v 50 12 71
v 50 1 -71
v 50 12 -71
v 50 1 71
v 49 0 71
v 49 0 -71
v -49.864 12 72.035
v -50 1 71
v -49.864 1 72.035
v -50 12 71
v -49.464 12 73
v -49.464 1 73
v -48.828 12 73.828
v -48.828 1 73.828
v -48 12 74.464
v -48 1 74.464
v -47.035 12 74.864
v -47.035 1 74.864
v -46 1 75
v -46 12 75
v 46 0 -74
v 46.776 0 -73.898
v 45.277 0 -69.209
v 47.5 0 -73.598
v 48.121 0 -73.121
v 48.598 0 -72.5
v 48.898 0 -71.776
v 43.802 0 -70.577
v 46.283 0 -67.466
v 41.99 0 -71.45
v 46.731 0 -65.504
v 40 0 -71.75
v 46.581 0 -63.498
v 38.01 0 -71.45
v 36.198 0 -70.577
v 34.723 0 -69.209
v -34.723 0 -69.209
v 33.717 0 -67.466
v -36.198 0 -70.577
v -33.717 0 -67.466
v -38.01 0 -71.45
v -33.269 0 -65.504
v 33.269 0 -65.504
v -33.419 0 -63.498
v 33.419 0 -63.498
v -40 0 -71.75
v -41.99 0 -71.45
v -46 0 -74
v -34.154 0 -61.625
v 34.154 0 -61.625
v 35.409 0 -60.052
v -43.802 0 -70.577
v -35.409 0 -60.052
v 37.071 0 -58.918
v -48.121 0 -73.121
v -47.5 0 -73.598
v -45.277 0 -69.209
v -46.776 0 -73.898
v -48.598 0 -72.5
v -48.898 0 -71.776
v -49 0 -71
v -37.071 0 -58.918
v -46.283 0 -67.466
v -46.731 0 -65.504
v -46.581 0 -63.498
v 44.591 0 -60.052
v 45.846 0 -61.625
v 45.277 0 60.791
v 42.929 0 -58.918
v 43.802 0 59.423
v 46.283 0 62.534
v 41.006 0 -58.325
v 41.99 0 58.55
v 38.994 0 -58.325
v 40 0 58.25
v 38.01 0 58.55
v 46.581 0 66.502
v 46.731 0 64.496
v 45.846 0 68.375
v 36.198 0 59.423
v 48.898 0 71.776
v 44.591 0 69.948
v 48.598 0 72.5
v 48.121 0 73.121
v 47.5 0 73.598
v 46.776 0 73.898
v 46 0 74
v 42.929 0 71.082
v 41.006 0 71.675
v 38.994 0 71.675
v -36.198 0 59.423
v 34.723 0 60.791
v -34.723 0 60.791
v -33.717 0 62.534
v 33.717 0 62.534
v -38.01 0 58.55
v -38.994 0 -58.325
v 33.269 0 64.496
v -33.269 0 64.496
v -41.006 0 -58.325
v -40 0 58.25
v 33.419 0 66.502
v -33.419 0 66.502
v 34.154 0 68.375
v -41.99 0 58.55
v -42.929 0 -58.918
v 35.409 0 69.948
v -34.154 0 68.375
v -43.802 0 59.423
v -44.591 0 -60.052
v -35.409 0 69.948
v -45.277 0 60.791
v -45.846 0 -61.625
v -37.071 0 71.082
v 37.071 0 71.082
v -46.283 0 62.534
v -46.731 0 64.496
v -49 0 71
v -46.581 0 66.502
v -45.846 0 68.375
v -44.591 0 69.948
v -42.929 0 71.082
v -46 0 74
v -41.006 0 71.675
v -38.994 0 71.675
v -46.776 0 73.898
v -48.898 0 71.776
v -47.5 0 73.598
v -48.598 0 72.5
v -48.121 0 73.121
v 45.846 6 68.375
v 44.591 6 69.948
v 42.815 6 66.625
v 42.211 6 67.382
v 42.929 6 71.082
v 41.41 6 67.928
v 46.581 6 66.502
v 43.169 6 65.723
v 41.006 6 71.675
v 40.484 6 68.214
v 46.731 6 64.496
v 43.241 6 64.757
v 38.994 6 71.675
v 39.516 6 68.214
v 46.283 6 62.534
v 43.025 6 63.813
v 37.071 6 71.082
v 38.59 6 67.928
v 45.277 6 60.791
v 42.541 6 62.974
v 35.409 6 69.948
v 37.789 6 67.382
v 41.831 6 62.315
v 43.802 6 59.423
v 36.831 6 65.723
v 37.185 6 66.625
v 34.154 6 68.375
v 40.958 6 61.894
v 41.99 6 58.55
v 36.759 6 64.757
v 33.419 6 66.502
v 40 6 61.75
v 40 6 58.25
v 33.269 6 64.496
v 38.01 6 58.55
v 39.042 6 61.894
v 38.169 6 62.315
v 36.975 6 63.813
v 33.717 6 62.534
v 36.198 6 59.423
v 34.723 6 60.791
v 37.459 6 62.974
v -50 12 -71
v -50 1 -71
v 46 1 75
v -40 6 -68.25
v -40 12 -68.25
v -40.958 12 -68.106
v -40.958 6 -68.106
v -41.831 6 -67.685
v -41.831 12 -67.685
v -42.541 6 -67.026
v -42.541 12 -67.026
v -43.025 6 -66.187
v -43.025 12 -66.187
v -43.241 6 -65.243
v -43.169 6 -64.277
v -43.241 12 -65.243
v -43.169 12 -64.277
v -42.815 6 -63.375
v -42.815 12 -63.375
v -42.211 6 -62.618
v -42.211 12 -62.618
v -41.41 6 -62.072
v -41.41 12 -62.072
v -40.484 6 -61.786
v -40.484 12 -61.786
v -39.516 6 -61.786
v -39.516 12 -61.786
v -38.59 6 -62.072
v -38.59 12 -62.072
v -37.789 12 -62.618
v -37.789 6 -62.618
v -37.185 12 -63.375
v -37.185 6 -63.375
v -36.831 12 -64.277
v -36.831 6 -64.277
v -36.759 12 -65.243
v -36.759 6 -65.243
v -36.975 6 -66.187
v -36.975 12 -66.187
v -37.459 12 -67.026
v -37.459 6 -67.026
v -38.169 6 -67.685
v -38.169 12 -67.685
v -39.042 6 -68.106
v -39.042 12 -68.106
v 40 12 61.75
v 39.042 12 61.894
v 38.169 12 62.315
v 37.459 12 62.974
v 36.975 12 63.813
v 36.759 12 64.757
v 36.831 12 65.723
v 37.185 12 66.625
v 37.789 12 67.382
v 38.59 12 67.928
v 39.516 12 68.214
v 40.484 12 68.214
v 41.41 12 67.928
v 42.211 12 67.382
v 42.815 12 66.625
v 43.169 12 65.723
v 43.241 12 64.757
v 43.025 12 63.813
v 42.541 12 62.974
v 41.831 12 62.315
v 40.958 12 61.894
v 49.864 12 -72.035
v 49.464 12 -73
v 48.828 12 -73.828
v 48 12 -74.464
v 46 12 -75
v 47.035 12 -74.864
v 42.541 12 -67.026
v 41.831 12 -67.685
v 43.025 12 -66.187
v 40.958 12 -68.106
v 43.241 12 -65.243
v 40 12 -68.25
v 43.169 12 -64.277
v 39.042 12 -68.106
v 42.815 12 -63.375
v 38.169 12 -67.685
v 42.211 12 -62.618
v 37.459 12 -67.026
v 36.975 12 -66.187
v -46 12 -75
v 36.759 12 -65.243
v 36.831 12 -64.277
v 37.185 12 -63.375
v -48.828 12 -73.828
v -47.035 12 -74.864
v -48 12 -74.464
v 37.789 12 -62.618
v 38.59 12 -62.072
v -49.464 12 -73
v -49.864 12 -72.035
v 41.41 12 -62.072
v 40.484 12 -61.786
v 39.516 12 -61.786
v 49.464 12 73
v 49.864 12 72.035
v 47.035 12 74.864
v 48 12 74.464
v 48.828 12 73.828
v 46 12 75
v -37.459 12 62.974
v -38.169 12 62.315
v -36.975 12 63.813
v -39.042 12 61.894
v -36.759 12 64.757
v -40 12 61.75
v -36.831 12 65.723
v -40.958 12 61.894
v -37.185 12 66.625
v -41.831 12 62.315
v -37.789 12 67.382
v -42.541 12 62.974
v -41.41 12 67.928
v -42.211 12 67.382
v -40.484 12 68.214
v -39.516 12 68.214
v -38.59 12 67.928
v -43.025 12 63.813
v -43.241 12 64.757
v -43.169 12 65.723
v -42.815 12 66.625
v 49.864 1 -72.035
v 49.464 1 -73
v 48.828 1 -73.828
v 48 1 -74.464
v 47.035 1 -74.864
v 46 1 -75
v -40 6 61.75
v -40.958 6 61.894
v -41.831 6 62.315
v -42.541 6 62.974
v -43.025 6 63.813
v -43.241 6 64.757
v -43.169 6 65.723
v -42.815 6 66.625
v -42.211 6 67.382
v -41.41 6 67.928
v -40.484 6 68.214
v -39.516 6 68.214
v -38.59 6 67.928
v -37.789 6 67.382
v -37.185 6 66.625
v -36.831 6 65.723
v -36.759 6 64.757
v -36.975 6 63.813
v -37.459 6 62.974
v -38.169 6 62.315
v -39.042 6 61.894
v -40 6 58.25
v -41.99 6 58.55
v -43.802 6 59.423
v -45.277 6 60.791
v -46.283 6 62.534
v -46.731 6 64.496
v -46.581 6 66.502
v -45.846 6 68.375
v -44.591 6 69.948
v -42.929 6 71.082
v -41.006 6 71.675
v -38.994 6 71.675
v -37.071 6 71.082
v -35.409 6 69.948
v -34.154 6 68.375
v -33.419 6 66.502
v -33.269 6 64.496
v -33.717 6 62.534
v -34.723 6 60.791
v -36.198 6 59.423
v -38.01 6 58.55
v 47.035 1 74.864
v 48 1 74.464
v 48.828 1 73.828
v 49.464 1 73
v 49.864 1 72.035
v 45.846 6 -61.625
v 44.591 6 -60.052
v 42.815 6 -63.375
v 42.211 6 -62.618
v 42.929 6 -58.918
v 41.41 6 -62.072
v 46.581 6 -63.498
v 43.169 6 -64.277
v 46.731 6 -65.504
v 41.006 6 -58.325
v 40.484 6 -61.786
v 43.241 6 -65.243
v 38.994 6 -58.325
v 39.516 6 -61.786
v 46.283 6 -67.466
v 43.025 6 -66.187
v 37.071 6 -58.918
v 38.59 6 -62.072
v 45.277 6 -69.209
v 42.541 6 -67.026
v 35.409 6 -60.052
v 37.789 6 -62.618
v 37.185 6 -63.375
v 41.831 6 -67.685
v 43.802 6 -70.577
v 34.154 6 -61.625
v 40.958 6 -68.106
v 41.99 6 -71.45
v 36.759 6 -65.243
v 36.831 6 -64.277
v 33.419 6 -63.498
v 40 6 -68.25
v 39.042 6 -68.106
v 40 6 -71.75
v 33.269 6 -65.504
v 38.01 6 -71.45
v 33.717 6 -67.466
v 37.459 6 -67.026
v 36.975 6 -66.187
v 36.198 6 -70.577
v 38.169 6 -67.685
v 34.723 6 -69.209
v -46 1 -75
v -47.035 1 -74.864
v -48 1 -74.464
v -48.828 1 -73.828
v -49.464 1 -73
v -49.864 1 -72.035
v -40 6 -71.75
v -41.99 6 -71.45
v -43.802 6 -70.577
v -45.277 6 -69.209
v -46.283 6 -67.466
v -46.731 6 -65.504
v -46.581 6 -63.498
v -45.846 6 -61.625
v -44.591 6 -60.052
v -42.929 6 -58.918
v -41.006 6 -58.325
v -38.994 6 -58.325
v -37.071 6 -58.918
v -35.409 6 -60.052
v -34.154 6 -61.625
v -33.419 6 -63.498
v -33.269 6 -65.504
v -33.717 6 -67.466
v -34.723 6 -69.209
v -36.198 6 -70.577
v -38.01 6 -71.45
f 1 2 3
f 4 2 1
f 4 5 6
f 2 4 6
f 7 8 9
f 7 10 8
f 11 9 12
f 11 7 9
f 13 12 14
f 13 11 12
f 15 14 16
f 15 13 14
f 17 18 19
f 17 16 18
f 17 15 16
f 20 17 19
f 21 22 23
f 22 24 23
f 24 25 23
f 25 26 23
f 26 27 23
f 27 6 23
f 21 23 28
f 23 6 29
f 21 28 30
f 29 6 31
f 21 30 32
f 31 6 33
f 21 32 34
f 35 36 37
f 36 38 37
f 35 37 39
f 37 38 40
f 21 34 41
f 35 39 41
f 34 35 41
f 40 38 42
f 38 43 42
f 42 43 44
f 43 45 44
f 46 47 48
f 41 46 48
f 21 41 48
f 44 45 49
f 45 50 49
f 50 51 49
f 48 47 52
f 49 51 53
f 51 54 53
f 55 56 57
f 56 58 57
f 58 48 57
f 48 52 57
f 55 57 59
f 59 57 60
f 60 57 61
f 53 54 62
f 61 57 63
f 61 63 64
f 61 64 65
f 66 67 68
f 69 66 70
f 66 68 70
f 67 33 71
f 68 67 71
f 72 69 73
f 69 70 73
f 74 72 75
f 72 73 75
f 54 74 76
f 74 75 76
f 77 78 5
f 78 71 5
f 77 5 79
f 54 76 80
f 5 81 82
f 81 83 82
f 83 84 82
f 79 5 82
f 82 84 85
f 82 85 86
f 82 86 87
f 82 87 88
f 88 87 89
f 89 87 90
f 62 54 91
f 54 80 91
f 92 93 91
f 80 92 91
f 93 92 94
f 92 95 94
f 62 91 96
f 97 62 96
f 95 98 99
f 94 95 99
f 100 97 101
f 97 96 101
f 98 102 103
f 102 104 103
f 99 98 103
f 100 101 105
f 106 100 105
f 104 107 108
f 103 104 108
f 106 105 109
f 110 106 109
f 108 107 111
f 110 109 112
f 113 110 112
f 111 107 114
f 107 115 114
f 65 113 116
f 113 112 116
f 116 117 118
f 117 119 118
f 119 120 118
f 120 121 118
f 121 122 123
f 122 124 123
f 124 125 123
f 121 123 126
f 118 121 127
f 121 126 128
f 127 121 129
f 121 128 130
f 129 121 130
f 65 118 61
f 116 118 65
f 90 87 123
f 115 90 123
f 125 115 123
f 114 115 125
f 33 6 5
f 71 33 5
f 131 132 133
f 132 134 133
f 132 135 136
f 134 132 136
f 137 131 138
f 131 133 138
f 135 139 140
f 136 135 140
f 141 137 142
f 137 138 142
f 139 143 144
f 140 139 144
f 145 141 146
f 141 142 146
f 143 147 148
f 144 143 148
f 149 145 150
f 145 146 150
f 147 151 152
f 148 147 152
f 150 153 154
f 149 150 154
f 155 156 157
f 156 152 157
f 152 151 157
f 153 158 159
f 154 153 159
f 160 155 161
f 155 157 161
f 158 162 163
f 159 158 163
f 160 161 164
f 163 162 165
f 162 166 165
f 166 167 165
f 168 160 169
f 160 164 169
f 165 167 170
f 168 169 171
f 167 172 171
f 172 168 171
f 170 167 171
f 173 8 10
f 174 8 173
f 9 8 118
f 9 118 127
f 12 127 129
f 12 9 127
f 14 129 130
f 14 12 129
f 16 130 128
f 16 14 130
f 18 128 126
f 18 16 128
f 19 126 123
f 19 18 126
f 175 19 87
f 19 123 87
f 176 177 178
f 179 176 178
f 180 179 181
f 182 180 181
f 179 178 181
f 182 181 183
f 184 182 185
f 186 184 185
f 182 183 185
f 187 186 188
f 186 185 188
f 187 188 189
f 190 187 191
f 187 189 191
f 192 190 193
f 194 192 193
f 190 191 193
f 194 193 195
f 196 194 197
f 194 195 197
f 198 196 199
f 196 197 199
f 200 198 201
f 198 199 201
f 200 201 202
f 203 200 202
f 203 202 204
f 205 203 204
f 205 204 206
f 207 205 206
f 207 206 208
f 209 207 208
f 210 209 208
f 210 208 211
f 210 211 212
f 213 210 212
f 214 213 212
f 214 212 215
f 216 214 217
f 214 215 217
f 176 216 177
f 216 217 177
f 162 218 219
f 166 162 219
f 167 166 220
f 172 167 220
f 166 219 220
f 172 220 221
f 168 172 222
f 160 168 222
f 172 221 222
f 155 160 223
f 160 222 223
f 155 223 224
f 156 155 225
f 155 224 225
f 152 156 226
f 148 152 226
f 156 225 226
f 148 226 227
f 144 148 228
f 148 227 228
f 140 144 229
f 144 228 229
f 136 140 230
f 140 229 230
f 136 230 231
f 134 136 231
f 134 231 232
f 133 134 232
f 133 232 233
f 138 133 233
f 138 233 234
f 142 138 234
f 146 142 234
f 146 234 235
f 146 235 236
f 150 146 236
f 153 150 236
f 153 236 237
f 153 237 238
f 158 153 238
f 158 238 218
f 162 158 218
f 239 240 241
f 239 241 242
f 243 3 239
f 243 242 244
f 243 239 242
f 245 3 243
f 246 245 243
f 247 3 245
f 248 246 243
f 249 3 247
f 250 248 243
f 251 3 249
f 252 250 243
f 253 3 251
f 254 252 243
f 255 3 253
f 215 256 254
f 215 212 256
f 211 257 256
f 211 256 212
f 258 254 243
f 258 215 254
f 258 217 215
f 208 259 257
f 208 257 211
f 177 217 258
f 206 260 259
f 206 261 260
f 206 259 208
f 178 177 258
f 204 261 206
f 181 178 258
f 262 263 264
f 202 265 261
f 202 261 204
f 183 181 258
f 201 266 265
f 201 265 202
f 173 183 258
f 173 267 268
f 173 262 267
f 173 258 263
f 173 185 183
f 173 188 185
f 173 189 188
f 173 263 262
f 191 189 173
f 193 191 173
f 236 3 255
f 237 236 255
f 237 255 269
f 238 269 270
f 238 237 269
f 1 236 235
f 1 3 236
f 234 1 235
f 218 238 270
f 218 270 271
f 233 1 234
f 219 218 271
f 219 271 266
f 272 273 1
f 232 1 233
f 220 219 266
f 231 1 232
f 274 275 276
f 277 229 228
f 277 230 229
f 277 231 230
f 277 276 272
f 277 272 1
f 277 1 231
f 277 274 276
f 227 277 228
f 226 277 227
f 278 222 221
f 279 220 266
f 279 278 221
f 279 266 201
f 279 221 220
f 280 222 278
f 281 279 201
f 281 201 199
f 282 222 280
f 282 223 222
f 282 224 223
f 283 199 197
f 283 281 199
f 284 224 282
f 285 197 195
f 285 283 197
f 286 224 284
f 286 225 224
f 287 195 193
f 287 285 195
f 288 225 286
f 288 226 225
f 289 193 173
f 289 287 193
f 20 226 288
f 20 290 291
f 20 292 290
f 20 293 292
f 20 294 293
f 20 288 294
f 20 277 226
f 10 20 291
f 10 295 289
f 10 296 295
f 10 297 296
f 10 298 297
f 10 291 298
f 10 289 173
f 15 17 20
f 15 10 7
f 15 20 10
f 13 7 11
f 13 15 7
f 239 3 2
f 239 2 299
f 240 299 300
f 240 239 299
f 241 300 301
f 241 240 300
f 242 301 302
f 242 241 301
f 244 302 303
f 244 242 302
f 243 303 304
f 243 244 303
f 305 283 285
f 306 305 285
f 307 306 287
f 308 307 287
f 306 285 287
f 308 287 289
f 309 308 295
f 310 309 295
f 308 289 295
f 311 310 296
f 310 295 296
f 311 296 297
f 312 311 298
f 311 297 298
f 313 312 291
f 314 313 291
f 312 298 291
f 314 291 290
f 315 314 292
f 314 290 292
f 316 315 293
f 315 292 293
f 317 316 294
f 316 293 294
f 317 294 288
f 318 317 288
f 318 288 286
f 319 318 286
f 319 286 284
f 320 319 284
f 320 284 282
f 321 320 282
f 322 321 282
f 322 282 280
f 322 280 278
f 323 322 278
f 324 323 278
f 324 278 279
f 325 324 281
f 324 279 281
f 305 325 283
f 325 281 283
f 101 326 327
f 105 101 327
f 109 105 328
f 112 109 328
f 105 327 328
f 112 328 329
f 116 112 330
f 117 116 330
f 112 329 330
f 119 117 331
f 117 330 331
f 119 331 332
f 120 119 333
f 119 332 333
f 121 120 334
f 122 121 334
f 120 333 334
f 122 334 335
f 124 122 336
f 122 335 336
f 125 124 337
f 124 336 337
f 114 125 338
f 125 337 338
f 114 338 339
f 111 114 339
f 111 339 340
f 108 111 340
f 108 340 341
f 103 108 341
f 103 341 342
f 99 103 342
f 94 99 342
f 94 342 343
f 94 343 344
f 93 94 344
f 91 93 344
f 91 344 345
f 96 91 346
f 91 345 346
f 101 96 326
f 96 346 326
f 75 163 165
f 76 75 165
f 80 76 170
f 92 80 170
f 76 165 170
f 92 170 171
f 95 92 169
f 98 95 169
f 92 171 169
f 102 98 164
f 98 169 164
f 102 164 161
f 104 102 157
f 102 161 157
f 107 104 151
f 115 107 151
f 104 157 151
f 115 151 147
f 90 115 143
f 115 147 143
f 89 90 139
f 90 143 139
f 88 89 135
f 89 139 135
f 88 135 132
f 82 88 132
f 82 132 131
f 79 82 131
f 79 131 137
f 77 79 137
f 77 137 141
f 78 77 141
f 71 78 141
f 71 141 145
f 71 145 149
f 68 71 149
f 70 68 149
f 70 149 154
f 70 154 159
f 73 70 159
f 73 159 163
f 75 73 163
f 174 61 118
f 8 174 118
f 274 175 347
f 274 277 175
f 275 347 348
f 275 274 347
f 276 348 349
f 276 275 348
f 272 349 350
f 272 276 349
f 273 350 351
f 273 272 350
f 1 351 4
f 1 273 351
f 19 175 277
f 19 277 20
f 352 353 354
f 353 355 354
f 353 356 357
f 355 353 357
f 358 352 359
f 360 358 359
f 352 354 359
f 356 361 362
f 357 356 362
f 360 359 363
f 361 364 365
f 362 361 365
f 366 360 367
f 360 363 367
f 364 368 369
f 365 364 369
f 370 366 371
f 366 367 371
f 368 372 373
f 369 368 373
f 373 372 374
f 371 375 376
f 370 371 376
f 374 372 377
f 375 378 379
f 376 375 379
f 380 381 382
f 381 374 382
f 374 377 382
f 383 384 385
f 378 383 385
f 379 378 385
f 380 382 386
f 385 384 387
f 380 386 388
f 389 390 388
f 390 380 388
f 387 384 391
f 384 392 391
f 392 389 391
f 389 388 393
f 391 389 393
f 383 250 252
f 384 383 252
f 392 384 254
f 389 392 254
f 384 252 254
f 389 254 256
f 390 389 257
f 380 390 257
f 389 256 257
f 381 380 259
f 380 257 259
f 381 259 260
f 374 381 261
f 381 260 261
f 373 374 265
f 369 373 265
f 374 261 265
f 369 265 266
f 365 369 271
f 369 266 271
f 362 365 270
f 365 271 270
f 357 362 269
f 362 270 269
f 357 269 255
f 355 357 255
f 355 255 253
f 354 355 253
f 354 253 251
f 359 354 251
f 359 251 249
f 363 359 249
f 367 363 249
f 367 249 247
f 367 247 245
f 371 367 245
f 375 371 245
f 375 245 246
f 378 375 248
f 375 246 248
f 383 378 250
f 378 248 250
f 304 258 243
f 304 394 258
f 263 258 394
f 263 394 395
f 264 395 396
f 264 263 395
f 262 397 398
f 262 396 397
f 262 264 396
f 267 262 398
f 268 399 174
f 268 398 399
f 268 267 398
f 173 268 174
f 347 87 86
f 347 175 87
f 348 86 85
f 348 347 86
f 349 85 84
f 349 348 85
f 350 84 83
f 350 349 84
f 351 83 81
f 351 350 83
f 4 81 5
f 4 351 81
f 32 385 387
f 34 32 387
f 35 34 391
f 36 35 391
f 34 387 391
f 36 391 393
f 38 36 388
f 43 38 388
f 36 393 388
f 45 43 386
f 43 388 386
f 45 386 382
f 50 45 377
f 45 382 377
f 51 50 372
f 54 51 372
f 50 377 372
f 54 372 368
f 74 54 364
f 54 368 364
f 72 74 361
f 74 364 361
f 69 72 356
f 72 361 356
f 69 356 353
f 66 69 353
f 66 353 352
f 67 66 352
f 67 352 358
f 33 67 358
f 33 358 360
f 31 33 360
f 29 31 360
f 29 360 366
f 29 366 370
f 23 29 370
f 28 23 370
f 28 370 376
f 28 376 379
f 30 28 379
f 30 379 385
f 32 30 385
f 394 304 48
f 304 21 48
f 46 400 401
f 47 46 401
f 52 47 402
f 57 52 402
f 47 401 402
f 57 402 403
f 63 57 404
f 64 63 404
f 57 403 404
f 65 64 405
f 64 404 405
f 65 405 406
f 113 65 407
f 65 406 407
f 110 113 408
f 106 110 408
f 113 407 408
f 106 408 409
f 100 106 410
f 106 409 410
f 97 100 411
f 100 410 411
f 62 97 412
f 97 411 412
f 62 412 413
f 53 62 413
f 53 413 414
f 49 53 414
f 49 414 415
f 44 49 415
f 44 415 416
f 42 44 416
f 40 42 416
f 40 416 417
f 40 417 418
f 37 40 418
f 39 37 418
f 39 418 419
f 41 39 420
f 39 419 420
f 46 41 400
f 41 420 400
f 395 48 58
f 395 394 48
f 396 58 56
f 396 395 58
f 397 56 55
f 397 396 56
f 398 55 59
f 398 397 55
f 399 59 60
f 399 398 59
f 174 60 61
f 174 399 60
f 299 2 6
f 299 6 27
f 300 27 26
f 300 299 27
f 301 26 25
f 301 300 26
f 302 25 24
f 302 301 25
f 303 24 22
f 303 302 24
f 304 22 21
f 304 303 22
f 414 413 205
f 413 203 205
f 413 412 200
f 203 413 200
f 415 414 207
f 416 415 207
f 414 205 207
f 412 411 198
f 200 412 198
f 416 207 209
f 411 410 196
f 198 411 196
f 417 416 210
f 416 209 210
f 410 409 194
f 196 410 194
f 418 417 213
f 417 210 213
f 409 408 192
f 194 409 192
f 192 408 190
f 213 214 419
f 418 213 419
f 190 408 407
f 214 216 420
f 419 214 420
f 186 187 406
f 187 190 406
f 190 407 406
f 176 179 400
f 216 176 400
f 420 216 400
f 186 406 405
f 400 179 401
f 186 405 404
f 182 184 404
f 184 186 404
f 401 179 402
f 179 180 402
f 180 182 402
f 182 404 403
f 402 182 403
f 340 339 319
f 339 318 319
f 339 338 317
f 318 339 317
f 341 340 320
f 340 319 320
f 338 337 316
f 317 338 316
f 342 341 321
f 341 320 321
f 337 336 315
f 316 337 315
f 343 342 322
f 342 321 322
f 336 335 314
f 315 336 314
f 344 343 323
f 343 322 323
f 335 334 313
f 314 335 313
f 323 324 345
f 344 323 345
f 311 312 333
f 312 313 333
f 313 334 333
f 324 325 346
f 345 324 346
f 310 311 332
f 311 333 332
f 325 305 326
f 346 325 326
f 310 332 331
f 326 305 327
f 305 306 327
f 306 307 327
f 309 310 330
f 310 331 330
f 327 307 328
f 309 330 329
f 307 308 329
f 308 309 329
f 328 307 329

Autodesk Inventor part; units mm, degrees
ref_plane "YZ Plane" through (0, 0, 0) normal (1, 0, 0) x (0, 1, 0)
ref_plane "XZ Plane" through (0, 0, 0) normal (0, 1, 0) x (-1, 0, 0)
ref_plane "XY Plane" through (0, 0, 0) normal (0, 0, 1) x (1, 0, 0)
sketch "Sketch1" plane through (0, 0, 0) normal (0, 1, 0) x (-1, 0, 0)
  line L0 (-50, 75) -> (50, 75)
  line L1 (50, 75) -> (50, -75)
  line L2 (50, -75) -> (-50, -75)
  line L3 (-50, -75) -> (-50, 75)
  line L4 (-50, 75) -> (50, -75) construction
  line L5 (50, 75) -> (-50, -75) construction
  point P0 (0, 0)
  dimension "d0" = 150
  dimension "d1" = 100
extrude "Extrusion1" add sketch "Sketch1" along normal blind 12
sketch "Sketch3" plane through (0, 0, 0) normal (0, -1, 0) x (1, 0, 0)
  circle A0 centre (40, 65) radius 7
  circle A1 centre (40, 65) radius 3.25
  line L0 (50, 75) -> (50, -75) projected
  line L1 (-50, 75) -> (50, 75) projected
  circle A2 centre (40, -65) radius 3.25
  circle A3 centre (40, -65) radius 7
  circle A4 centre (-40, 65) radius 3.25
  circle A5 centre (-40, 65) radius 7
  circle A6 centre (-40, -65) radius 3.25
  circle A7 centre (-40, -65) radius 7
  point P0 (0, 0)
  dimension "d4" = 14
  dimension "d5" = 6.5
  dimension "d6" = 10
  dimension "d7" = 10
  dimension "d10" = 130
  dimension "d13" = 80
hole "Hole1" at (40, 0, 65) at (40, 0, -65) at (-40, 0, 65) at (-40, 0, -65) direction (0, 1, 0) diameter 6.5 end through all counterbore diameter 13.5 counterbore depth 6
fillet "Fillet1" radius 4 4 edges at (50, 6, 75) (50, 6, -75) (-50, 6, -75) (-50, 6, 75)
chamfer "Chamfer3" distance 1 angle 45 8 edges at (0, 0, 75) (48.8284, 0, 73.8284) (50, 0, 0) (48.8284, 0, -73.8284) (0, 0, -75) (-48.8284, 0, -73.8284) (-50, 0, 0) (-48.8284, 0, 73.8284)
properties part number "PCB_Cover"
